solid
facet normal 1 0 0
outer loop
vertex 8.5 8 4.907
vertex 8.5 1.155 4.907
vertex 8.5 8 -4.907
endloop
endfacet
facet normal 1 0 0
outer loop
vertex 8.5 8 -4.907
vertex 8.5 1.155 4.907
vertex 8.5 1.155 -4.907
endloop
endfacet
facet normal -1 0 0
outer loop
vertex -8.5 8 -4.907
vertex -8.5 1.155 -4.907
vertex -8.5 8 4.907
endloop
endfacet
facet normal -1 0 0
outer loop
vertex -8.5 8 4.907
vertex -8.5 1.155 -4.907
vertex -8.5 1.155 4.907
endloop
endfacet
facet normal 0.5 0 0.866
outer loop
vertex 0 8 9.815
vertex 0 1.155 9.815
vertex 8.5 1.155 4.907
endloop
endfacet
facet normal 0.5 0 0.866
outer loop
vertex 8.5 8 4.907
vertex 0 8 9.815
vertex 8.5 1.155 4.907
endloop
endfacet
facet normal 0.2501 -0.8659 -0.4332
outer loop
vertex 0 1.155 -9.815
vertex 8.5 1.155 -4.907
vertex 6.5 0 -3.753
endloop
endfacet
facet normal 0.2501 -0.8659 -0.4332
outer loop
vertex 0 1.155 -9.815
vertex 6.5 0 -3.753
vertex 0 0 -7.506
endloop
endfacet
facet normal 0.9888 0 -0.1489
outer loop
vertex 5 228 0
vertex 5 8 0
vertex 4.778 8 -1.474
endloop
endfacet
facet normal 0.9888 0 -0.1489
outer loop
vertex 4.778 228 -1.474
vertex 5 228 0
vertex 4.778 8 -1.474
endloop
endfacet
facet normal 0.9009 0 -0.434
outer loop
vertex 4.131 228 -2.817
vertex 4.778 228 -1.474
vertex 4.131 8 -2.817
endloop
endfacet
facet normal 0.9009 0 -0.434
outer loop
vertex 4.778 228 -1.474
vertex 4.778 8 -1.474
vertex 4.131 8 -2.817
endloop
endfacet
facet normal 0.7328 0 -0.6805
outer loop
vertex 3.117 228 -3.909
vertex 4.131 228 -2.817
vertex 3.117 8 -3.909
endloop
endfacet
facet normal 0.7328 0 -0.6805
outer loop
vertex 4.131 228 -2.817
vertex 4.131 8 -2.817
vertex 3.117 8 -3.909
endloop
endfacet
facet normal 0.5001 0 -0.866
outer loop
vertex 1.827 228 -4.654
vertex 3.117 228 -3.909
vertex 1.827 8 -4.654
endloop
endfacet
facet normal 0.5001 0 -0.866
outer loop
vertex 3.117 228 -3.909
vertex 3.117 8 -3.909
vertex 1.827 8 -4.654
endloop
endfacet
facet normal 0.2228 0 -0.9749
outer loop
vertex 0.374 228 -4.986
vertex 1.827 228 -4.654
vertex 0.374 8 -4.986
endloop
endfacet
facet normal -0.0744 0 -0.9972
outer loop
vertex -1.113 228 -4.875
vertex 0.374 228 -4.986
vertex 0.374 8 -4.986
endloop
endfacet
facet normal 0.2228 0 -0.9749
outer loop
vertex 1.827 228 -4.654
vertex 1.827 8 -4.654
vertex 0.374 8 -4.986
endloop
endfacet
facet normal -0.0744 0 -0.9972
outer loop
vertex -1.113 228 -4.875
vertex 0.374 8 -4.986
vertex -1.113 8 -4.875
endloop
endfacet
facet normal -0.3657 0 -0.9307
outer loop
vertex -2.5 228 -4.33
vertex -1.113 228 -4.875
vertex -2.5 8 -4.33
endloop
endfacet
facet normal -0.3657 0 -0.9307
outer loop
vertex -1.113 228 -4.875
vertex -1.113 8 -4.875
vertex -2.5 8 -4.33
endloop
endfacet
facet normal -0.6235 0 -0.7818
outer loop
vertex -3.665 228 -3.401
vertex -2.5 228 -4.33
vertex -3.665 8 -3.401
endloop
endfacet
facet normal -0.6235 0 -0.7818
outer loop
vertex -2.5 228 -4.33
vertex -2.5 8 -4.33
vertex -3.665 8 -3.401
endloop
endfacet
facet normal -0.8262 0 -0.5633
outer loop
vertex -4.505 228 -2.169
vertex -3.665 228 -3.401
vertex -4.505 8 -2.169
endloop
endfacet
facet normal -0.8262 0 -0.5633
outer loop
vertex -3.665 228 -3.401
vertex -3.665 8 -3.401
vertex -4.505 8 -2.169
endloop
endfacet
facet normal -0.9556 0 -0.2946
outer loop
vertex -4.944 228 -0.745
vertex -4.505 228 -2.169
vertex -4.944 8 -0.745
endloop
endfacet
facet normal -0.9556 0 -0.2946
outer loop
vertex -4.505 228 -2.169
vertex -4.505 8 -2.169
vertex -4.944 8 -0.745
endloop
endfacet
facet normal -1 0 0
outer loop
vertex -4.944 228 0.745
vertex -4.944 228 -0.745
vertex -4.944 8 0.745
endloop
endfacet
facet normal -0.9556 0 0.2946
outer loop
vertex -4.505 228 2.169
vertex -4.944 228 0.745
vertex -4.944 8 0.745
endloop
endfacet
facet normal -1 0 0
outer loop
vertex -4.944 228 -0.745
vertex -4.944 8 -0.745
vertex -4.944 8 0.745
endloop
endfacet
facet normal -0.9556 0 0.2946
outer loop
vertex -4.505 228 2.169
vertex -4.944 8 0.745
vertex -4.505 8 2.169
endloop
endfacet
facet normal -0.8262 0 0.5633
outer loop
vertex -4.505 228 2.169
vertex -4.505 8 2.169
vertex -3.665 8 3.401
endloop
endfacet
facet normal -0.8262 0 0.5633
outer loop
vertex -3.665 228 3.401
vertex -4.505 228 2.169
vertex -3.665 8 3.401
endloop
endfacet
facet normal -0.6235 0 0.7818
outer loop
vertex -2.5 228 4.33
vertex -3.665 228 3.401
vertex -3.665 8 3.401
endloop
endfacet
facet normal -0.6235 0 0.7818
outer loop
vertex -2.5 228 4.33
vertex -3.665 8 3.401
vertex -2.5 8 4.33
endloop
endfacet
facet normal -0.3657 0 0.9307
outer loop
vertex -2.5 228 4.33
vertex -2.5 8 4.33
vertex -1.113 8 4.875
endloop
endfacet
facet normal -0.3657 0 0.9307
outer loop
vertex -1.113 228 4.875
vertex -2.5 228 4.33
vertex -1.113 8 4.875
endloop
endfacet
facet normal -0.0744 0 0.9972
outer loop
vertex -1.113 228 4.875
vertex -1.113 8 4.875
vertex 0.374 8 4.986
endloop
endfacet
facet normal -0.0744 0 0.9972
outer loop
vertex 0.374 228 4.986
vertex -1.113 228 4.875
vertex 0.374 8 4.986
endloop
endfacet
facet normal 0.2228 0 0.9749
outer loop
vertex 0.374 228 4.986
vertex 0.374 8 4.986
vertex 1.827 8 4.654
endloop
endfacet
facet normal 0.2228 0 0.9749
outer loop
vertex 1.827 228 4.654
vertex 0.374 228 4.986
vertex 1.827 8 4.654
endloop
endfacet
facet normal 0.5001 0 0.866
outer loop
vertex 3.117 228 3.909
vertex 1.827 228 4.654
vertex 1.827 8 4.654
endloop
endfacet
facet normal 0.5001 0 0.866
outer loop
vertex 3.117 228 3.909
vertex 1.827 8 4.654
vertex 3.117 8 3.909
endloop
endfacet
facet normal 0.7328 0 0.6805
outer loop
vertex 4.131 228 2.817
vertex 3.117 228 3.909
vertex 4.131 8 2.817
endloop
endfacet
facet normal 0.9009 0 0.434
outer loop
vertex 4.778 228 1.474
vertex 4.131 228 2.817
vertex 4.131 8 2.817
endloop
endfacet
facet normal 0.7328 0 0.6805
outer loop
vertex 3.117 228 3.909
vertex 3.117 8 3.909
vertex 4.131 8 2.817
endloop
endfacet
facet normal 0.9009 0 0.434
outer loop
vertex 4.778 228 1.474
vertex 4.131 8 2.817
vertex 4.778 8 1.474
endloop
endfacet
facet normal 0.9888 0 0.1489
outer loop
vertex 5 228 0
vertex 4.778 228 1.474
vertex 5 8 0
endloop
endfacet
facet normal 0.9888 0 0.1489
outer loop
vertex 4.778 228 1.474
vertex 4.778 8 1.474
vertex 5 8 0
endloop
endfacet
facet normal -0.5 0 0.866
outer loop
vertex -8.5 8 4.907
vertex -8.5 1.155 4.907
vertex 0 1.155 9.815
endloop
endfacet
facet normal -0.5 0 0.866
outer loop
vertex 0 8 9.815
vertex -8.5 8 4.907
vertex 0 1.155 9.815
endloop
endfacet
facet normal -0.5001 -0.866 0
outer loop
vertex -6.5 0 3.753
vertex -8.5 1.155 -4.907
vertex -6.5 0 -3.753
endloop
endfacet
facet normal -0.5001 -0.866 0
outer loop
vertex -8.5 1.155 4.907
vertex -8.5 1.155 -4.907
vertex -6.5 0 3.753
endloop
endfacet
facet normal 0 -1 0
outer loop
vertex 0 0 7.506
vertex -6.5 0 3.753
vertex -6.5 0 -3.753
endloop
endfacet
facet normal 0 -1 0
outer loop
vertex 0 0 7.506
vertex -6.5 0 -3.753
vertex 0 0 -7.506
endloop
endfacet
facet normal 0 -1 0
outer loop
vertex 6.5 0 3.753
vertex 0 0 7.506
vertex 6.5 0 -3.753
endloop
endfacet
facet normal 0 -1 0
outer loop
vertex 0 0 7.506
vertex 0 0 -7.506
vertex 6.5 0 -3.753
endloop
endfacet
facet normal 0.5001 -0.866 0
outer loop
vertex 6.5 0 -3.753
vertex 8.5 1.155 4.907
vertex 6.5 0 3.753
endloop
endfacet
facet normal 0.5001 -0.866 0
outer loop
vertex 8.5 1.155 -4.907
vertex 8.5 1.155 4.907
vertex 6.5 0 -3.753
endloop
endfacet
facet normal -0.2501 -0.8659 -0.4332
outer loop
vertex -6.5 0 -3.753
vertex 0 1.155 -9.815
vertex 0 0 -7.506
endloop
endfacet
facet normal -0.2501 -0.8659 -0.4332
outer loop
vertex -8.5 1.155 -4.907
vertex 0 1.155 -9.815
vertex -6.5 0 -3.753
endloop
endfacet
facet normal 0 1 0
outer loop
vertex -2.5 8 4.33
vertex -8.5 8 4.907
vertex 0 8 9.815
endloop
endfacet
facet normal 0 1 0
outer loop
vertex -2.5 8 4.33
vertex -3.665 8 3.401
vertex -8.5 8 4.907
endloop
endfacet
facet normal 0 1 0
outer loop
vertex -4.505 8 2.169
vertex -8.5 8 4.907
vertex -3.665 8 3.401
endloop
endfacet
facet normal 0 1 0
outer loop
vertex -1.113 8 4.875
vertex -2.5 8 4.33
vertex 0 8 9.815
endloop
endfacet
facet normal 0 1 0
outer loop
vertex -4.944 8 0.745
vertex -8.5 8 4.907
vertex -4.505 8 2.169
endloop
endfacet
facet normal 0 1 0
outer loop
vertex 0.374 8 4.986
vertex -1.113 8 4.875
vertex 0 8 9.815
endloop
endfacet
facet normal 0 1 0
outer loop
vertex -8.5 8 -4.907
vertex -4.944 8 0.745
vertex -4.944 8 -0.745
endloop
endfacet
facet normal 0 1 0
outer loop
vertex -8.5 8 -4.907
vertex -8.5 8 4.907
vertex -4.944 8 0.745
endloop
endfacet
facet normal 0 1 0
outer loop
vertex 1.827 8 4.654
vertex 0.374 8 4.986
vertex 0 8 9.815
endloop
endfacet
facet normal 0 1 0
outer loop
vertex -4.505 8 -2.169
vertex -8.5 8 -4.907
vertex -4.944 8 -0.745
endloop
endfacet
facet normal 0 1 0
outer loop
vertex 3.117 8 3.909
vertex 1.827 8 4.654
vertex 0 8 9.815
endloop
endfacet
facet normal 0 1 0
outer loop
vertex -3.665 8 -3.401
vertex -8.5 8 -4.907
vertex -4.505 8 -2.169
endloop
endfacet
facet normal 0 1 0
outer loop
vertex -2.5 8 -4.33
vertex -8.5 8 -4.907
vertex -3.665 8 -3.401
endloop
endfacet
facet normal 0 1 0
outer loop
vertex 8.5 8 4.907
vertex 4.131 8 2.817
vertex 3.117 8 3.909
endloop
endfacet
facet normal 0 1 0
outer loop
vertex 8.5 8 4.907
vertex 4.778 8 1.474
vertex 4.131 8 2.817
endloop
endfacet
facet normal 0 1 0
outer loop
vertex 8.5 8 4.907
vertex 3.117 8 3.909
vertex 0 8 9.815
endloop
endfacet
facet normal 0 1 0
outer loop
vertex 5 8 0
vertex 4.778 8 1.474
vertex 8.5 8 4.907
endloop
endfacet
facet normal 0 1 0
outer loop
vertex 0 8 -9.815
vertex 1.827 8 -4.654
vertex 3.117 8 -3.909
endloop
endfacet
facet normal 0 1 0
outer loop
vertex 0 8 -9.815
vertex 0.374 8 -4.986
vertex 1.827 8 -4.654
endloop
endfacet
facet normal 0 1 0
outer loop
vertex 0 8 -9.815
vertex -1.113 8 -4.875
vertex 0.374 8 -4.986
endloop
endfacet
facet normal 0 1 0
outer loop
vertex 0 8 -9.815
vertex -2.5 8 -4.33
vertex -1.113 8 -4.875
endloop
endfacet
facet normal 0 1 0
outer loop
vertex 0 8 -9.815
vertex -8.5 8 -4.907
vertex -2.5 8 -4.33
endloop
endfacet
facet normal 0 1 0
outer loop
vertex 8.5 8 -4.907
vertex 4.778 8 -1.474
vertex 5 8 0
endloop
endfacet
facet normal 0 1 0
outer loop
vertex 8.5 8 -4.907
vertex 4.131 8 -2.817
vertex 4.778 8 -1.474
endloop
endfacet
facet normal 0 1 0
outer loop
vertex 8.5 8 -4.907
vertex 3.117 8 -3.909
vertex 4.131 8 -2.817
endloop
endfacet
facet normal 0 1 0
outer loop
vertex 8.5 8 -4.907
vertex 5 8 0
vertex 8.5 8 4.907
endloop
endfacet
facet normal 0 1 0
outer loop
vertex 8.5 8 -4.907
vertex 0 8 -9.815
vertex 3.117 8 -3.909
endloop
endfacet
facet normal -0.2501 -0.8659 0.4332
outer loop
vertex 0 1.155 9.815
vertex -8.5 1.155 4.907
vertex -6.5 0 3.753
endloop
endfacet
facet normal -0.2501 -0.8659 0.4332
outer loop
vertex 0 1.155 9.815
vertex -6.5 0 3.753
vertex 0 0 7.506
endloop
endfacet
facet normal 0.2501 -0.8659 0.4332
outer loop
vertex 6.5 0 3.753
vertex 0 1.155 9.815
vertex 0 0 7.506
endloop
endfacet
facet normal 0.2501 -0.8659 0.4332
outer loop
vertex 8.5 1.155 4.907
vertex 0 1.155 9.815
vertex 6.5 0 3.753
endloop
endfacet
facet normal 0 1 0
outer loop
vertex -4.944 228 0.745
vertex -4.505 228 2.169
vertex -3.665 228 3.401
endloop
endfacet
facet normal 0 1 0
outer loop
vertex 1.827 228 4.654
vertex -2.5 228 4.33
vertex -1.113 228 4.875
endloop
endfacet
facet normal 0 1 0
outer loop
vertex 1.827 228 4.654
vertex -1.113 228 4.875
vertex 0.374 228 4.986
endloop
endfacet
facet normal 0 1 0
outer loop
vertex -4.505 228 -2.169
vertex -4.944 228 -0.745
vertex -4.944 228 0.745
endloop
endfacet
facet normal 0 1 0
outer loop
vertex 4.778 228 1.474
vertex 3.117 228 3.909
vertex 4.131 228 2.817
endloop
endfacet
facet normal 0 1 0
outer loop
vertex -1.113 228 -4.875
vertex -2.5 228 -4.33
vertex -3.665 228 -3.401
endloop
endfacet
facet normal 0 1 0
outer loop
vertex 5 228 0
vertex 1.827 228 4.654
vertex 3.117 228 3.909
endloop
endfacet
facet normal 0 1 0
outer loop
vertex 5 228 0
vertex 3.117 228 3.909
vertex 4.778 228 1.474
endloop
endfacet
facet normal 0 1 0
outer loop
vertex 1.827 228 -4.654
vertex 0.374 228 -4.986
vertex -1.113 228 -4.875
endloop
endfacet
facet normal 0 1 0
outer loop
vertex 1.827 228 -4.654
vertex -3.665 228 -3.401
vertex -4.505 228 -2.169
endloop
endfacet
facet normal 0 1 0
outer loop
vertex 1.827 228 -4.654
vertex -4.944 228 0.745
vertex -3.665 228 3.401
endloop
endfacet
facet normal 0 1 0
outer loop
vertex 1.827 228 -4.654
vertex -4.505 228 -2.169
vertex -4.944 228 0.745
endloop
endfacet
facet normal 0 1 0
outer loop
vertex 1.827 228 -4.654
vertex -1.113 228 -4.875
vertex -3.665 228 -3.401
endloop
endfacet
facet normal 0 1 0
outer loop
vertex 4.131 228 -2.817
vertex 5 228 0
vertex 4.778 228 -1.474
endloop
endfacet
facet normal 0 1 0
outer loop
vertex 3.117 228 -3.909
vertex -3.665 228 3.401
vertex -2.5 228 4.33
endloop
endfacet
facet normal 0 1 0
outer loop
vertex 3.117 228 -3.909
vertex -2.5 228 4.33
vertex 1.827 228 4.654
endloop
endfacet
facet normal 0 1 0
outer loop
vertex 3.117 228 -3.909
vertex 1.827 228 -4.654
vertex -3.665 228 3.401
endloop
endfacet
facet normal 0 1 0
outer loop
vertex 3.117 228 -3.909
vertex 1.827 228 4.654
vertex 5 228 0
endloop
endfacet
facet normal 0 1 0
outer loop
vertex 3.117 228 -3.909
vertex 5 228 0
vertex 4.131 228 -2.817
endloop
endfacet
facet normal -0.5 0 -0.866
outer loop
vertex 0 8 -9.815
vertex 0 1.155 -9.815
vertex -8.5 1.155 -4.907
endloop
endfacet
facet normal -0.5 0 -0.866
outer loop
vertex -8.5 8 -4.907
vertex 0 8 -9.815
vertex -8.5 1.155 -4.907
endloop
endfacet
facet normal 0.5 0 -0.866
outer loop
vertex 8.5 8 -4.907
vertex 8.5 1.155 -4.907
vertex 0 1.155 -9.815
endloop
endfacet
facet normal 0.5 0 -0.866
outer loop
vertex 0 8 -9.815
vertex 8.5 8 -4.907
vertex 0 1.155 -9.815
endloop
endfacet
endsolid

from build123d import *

# Parameters (mm, degrees)
EXTRUDE_1_DEPTH = 8
SKETCH_2_R      = 5
EXTRUDE_2_DEPTH = 220
CHAMFER_1_SIZE  = 2
CHAMFER_1_SIZE2 = 1.154700538


with BuildPart() as part:
    # Эскиз1 → Бобышка-Вытянуть1 (new body)
    with BuildSketch(Plane(origin=(0, 0, 0), x_dir=(1, 0, 0), z_dir=(0, 1, 0))):
        Polygon((8.5, -4.907477288), (8.5, 4.907477288), (0, 9.814954576), (-8.5, 4.907477288), (-8.5, -4.907477288), (0, -9.814954576), align=None)
    extrude(amount=EXTRUDE_1_DEPTH)

    # Эскиз2 → Бобышка-Вытянуть2 (add)
    with BuildSketch(Plane(origin=(0, 8, 0), x_dir=(1, 0, 0), z_dir=(0, 1, 0))):
        Circle(SKETCH_2_R)
    extrude(amount=EXTRUDE_2_DEPTH)

    # Фаска1
    chamfer_1_edges = [part.edges().sort_by_distance(p)[0] for p in [
        (-4.25, 0, 7.361215932),
        (-8.5, 0, 0),
        (-4.25, 0, -7.361215932),
        (4.25, 0, -7.361215932),
        (8.5, 0, 0),
        (4.25, 0, 7.361215932),
    ]]
    chamfer_1_side = [part.faces().sort_by_distance(p)[0] for p in [
        (0, 0, 0),
    ]]
    chamfer(chamfer_1_edges, length=CHAMFER_1_SIZE, length2=CHAMFER_1_SIZE2, reference=chamfer_1_side[0])


solid = part.part
